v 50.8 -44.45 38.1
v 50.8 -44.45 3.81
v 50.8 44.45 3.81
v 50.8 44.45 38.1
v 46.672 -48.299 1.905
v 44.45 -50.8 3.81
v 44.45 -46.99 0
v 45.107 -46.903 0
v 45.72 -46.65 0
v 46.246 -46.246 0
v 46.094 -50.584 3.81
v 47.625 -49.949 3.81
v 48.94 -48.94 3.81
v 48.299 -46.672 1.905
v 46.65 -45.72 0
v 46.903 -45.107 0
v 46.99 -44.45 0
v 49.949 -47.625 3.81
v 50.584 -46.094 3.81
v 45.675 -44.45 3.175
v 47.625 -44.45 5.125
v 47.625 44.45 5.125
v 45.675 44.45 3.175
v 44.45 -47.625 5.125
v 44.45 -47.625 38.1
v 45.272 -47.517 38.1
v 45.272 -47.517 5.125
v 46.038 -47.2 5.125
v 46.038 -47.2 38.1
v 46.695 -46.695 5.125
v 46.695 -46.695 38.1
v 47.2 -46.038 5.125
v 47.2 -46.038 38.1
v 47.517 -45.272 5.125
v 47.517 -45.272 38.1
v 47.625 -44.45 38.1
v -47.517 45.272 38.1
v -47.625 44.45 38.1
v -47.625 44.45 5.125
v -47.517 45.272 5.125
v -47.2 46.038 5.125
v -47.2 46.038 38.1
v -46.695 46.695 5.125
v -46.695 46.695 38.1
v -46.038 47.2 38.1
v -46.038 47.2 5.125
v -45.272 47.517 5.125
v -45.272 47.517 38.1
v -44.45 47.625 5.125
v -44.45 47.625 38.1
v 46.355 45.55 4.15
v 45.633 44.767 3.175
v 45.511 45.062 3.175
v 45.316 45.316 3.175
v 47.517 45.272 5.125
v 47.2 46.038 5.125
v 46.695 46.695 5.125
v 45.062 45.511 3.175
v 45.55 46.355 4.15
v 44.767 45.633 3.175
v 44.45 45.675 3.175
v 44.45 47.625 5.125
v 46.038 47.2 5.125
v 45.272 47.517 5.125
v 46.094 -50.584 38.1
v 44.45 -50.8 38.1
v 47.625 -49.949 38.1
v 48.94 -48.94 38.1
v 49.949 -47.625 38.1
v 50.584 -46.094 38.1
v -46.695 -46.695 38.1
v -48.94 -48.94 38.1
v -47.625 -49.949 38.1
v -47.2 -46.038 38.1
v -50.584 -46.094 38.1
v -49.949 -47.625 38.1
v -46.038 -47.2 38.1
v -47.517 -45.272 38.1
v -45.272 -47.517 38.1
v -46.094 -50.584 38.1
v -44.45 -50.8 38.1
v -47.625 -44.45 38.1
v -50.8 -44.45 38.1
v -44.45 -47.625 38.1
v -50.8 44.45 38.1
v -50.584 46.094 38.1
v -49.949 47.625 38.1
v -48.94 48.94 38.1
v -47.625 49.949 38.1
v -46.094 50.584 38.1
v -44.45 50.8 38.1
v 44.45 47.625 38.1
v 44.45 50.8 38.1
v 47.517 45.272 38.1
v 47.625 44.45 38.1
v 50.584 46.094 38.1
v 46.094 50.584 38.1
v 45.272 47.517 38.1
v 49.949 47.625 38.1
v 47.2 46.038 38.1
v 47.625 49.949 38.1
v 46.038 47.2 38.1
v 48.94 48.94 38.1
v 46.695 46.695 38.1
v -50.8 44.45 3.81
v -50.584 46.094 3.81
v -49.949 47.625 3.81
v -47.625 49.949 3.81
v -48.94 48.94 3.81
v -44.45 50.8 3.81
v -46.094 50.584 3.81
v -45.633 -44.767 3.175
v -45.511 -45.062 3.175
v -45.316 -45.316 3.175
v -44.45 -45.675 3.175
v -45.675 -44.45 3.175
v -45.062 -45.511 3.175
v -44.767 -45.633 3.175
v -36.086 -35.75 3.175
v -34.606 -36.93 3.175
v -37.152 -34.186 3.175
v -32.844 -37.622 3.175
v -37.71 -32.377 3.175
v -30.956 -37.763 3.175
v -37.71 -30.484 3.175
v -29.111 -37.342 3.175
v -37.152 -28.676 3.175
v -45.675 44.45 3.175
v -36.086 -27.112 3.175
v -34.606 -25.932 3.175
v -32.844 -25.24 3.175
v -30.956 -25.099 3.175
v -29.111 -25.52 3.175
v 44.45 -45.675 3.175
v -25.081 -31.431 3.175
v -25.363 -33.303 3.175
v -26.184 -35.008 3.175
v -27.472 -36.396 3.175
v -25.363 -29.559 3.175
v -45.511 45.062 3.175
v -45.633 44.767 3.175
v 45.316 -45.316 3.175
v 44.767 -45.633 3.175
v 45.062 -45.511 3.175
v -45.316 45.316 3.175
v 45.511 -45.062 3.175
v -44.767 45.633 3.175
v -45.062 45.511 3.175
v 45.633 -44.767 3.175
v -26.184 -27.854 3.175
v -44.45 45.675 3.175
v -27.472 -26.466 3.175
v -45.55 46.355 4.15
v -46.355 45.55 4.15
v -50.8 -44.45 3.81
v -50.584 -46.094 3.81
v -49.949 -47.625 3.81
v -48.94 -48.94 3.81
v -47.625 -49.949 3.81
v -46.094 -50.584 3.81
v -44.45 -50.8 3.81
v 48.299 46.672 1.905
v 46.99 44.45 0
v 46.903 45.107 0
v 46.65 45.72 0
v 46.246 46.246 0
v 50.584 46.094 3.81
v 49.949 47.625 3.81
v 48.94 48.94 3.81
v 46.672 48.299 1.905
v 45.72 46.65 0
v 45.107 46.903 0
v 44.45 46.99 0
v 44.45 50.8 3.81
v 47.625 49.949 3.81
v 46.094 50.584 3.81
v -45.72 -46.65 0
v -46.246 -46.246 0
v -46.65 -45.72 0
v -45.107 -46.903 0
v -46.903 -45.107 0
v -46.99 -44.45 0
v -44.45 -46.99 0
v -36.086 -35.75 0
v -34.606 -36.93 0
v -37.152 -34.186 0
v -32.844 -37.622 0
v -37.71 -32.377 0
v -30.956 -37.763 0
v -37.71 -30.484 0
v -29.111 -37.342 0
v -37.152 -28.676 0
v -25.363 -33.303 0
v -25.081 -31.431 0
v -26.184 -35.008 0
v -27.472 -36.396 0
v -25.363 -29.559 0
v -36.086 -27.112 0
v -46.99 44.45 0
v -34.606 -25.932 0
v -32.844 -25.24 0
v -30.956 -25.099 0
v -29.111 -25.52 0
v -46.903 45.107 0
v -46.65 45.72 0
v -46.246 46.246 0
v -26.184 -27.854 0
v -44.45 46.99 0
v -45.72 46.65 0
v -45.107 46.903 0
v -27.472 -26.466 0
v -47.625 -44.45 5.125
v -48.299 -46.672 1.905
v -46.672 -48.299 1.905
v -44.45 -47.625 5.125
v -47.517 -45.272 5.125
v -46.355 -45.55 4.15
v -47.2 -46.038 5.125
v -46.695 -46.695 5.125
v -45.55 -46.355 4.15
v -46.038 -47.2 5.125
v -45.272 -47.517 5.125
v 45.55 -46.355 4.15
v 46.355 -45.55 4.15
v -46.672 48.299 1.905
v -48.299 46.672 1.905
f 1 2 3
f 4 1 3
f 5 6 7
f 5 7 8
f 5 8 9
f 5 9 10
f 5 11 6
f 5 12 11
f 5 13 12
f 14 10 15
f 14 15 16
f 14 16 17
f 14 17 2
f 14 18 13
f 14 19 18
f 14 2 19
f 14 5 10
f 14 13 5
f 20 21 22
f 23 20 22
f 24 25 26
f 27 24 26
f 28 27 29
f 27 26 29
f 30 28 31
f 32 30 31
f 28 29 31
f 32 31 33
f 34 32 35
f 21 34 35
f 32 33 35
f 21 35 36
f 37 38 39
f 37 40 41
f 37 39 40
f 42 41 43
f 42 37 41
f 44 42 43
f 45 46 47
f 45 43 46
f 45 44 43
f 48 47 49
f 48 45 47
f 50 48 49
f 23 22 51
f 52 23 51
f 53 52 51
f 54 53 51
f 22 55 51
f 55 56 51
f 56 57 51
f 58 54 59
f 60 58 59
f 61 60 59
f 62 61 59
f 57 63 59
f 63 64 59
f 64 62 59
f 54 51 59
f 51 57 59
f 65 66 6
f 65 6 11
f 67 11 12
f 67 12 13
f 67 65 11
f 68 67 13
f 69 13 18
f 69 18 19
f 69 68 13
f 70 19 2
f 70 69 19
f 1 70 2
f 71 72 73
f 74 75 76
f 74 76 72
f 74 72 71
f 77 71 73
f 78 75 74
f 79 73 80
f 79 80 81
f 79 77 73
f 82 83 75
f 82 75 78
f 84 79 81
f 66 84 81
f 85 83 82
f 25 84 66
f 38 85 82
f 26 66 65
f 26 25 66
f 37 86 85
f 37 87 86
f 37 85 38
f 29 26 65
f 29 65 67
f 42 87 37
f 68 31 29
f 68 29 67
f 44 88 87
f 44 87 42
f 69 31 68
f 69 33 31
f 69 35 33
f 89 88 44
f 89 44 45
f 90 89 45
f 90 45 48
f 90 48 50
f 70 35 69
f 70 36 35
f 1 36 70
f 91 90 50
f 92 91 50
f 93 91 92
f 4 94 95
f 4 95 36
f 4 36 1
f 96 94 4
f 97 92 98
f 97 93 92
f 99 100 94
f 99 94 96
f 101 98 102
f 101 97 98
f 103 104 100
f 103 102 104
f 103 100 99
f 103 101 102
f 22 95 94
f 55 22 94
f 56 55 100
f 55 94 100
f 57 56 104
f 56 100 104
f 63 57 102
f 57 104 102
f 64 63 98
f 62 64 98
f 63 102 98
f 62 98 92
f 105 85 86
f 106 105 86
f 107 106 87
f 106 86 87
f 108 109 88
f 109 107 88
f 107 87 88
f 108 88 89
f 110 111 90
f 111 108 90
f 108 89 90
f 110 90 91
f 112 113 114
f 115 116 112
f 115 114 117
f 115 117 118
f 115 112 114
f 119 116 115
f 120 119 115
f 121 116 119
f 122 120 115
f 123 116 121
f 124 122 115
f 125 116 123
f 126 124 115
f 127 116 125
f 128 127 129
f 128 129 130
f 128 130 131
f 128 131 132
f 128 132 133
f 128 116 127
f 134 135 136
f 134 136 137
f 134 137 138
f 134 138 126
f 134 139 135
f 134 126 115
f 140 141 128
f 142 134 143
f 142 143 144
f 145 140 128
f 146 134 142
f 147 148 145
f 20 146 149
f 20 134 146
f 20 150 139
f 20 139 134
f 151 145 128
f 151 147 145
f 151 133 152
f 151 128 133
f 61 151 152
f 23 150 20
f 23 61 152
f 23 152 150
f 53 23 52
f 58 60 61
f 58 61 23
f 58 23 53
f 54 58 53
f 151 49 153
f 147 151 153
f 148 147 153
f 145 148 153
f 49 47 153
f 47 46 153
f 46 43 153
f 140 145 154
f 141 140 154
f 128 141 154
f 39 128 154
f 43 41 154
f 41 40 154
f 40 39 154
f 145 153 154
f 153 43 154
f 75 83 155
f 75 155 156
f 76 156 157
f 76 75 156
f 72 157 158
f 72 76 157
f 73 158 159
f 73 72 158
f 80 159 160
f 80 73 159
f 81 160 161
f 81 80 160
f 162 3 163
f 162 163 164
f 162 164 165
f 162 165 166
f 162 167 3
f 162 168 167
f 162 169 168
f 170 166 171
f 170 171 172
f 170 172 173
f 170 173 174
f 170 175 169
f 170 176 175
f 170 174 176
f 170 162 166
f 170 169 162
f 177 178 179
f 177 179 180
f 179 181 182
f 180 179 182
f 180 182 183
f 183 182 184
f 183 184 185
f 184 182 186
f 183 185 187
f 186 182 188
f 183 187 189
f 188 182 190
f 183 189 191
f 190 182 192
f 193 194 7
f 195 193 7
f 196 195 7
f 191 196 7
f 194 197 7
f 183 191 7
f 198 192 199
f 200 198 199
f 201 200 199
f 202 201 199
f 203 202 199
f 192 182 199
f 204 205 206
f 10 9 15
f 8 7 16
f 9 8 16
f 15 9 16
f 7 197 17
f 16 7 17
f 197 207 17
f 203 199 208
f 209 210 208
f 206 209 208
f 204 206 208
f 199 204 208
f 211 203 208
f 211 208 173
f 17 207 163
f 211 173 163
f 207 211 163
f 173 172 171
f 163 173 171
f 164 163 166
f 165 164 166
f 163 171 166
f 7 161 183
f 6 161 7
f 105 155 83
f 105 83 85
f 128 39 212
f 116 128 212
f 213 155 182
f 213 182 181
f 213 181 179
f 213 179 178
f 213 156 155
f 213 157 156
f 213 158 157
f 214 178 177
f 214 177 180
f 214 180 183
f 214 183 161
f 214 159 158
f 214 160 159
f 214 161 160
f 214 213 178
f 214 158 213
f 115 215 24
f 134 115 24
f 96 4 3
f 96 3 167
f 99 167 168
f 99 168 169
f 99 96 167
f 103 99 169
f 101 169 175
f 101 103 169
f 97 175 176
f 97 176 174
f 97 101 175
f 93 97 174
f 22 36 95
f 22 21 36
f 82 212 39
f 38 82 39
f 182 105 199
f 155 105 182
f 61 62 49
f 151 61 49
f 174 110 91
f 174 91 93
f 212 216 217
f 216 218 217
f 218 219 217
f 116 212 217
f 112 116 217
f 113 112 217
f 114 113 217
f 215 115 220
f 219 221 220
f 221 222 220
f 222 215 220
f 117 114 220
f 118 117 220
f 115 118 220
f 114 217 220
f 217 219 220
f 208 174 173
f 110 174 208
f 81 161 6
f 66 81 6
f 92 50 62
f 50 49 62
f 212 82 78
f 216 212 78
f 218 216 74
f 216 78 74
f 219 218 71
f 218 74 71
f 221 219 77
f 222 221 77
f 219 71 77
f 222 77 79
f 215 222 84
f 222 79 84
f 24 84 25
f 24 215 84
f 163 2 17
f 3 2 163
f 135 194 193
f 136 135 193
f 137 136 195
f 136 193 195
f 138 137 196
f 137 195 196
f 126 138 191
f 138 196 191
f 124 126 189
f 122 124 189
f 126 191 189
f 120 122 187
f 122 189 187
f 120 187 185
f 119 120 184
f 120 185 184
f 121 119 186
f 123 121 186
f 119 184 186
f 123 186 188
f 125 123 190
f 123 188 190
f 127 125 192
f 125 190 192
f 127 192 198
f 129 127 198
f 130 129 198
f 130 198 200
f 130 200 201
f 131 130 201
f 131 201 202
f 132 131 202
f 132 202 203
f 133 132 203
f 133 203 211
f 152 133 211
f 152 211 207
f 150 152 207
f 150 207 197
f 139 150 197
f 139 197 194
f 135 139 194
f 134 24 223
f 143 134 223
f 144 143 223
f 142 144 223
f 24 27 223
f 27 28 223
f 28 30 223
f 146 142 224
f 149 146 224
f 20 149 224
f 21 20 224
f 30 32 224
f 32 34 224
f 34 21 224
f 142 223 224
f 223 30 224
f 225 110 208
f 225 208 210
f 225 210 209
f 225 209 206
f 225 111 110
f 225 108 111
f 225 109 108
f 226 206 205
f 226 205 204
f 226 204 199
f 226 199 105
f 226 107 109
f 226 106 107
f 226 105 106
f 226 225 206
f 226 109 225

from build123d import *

# Parameters (mm, degrees)
F0_W     = 101.6
F0_H     = 101.6
F1_DEPTH = 38.1
F3_R     = 6.35
F4_SIZE  = 3.81
F5_T     = -3.175
F2_R     = 6.35
F6_DEPTH = 38.101


with BuildPart() as f1:
    # F0 (on Top) → F1 (new body)
    with BuildSketch(Plane.XY):
        Rectangle(F0_W, F0_H)
    extrude(amount=F1_DEPTH)

    # F3
    f3_edges = [f1.edges().sort_by_distance(p)[0] for p in [
        (-50.8, 50.8, 19.05),
        (50.8, -50.8, 19.05),
        (50.8, 50.8, 19.05),
        (-50.8, -50.8, 19.05),
    ]]
    fillet(f3_edges, radius=F3_R)

    # F4
    f4_edges = [f1.edges().sort_by_distance(p)[0] for p in [
        (0, -50.8, 0),
    ]]
    chamfer(f4_edges, length=F4_SIZE)

    # F5
    f5_openings = [f1.faces().sort_by_distance(p)[0] for p in [
        (0, 0, 38.1),
    ]]
    offset(amount=F5_T, openings=f5_openings)

    # F2 (on face) → F6 (cut, through all)
    with BuildSketch(Plane(origin=(0, 0, 0), x_dir=(1, 0, 0), z_dir=(0, 0, -1))):
        with Locations((-31.430896, 31.430896)):
            Circle(F2_R)
    extrude(amount=-F6_DEPTH, mode=Mode.SUBTRACT)


solid = f1.part
